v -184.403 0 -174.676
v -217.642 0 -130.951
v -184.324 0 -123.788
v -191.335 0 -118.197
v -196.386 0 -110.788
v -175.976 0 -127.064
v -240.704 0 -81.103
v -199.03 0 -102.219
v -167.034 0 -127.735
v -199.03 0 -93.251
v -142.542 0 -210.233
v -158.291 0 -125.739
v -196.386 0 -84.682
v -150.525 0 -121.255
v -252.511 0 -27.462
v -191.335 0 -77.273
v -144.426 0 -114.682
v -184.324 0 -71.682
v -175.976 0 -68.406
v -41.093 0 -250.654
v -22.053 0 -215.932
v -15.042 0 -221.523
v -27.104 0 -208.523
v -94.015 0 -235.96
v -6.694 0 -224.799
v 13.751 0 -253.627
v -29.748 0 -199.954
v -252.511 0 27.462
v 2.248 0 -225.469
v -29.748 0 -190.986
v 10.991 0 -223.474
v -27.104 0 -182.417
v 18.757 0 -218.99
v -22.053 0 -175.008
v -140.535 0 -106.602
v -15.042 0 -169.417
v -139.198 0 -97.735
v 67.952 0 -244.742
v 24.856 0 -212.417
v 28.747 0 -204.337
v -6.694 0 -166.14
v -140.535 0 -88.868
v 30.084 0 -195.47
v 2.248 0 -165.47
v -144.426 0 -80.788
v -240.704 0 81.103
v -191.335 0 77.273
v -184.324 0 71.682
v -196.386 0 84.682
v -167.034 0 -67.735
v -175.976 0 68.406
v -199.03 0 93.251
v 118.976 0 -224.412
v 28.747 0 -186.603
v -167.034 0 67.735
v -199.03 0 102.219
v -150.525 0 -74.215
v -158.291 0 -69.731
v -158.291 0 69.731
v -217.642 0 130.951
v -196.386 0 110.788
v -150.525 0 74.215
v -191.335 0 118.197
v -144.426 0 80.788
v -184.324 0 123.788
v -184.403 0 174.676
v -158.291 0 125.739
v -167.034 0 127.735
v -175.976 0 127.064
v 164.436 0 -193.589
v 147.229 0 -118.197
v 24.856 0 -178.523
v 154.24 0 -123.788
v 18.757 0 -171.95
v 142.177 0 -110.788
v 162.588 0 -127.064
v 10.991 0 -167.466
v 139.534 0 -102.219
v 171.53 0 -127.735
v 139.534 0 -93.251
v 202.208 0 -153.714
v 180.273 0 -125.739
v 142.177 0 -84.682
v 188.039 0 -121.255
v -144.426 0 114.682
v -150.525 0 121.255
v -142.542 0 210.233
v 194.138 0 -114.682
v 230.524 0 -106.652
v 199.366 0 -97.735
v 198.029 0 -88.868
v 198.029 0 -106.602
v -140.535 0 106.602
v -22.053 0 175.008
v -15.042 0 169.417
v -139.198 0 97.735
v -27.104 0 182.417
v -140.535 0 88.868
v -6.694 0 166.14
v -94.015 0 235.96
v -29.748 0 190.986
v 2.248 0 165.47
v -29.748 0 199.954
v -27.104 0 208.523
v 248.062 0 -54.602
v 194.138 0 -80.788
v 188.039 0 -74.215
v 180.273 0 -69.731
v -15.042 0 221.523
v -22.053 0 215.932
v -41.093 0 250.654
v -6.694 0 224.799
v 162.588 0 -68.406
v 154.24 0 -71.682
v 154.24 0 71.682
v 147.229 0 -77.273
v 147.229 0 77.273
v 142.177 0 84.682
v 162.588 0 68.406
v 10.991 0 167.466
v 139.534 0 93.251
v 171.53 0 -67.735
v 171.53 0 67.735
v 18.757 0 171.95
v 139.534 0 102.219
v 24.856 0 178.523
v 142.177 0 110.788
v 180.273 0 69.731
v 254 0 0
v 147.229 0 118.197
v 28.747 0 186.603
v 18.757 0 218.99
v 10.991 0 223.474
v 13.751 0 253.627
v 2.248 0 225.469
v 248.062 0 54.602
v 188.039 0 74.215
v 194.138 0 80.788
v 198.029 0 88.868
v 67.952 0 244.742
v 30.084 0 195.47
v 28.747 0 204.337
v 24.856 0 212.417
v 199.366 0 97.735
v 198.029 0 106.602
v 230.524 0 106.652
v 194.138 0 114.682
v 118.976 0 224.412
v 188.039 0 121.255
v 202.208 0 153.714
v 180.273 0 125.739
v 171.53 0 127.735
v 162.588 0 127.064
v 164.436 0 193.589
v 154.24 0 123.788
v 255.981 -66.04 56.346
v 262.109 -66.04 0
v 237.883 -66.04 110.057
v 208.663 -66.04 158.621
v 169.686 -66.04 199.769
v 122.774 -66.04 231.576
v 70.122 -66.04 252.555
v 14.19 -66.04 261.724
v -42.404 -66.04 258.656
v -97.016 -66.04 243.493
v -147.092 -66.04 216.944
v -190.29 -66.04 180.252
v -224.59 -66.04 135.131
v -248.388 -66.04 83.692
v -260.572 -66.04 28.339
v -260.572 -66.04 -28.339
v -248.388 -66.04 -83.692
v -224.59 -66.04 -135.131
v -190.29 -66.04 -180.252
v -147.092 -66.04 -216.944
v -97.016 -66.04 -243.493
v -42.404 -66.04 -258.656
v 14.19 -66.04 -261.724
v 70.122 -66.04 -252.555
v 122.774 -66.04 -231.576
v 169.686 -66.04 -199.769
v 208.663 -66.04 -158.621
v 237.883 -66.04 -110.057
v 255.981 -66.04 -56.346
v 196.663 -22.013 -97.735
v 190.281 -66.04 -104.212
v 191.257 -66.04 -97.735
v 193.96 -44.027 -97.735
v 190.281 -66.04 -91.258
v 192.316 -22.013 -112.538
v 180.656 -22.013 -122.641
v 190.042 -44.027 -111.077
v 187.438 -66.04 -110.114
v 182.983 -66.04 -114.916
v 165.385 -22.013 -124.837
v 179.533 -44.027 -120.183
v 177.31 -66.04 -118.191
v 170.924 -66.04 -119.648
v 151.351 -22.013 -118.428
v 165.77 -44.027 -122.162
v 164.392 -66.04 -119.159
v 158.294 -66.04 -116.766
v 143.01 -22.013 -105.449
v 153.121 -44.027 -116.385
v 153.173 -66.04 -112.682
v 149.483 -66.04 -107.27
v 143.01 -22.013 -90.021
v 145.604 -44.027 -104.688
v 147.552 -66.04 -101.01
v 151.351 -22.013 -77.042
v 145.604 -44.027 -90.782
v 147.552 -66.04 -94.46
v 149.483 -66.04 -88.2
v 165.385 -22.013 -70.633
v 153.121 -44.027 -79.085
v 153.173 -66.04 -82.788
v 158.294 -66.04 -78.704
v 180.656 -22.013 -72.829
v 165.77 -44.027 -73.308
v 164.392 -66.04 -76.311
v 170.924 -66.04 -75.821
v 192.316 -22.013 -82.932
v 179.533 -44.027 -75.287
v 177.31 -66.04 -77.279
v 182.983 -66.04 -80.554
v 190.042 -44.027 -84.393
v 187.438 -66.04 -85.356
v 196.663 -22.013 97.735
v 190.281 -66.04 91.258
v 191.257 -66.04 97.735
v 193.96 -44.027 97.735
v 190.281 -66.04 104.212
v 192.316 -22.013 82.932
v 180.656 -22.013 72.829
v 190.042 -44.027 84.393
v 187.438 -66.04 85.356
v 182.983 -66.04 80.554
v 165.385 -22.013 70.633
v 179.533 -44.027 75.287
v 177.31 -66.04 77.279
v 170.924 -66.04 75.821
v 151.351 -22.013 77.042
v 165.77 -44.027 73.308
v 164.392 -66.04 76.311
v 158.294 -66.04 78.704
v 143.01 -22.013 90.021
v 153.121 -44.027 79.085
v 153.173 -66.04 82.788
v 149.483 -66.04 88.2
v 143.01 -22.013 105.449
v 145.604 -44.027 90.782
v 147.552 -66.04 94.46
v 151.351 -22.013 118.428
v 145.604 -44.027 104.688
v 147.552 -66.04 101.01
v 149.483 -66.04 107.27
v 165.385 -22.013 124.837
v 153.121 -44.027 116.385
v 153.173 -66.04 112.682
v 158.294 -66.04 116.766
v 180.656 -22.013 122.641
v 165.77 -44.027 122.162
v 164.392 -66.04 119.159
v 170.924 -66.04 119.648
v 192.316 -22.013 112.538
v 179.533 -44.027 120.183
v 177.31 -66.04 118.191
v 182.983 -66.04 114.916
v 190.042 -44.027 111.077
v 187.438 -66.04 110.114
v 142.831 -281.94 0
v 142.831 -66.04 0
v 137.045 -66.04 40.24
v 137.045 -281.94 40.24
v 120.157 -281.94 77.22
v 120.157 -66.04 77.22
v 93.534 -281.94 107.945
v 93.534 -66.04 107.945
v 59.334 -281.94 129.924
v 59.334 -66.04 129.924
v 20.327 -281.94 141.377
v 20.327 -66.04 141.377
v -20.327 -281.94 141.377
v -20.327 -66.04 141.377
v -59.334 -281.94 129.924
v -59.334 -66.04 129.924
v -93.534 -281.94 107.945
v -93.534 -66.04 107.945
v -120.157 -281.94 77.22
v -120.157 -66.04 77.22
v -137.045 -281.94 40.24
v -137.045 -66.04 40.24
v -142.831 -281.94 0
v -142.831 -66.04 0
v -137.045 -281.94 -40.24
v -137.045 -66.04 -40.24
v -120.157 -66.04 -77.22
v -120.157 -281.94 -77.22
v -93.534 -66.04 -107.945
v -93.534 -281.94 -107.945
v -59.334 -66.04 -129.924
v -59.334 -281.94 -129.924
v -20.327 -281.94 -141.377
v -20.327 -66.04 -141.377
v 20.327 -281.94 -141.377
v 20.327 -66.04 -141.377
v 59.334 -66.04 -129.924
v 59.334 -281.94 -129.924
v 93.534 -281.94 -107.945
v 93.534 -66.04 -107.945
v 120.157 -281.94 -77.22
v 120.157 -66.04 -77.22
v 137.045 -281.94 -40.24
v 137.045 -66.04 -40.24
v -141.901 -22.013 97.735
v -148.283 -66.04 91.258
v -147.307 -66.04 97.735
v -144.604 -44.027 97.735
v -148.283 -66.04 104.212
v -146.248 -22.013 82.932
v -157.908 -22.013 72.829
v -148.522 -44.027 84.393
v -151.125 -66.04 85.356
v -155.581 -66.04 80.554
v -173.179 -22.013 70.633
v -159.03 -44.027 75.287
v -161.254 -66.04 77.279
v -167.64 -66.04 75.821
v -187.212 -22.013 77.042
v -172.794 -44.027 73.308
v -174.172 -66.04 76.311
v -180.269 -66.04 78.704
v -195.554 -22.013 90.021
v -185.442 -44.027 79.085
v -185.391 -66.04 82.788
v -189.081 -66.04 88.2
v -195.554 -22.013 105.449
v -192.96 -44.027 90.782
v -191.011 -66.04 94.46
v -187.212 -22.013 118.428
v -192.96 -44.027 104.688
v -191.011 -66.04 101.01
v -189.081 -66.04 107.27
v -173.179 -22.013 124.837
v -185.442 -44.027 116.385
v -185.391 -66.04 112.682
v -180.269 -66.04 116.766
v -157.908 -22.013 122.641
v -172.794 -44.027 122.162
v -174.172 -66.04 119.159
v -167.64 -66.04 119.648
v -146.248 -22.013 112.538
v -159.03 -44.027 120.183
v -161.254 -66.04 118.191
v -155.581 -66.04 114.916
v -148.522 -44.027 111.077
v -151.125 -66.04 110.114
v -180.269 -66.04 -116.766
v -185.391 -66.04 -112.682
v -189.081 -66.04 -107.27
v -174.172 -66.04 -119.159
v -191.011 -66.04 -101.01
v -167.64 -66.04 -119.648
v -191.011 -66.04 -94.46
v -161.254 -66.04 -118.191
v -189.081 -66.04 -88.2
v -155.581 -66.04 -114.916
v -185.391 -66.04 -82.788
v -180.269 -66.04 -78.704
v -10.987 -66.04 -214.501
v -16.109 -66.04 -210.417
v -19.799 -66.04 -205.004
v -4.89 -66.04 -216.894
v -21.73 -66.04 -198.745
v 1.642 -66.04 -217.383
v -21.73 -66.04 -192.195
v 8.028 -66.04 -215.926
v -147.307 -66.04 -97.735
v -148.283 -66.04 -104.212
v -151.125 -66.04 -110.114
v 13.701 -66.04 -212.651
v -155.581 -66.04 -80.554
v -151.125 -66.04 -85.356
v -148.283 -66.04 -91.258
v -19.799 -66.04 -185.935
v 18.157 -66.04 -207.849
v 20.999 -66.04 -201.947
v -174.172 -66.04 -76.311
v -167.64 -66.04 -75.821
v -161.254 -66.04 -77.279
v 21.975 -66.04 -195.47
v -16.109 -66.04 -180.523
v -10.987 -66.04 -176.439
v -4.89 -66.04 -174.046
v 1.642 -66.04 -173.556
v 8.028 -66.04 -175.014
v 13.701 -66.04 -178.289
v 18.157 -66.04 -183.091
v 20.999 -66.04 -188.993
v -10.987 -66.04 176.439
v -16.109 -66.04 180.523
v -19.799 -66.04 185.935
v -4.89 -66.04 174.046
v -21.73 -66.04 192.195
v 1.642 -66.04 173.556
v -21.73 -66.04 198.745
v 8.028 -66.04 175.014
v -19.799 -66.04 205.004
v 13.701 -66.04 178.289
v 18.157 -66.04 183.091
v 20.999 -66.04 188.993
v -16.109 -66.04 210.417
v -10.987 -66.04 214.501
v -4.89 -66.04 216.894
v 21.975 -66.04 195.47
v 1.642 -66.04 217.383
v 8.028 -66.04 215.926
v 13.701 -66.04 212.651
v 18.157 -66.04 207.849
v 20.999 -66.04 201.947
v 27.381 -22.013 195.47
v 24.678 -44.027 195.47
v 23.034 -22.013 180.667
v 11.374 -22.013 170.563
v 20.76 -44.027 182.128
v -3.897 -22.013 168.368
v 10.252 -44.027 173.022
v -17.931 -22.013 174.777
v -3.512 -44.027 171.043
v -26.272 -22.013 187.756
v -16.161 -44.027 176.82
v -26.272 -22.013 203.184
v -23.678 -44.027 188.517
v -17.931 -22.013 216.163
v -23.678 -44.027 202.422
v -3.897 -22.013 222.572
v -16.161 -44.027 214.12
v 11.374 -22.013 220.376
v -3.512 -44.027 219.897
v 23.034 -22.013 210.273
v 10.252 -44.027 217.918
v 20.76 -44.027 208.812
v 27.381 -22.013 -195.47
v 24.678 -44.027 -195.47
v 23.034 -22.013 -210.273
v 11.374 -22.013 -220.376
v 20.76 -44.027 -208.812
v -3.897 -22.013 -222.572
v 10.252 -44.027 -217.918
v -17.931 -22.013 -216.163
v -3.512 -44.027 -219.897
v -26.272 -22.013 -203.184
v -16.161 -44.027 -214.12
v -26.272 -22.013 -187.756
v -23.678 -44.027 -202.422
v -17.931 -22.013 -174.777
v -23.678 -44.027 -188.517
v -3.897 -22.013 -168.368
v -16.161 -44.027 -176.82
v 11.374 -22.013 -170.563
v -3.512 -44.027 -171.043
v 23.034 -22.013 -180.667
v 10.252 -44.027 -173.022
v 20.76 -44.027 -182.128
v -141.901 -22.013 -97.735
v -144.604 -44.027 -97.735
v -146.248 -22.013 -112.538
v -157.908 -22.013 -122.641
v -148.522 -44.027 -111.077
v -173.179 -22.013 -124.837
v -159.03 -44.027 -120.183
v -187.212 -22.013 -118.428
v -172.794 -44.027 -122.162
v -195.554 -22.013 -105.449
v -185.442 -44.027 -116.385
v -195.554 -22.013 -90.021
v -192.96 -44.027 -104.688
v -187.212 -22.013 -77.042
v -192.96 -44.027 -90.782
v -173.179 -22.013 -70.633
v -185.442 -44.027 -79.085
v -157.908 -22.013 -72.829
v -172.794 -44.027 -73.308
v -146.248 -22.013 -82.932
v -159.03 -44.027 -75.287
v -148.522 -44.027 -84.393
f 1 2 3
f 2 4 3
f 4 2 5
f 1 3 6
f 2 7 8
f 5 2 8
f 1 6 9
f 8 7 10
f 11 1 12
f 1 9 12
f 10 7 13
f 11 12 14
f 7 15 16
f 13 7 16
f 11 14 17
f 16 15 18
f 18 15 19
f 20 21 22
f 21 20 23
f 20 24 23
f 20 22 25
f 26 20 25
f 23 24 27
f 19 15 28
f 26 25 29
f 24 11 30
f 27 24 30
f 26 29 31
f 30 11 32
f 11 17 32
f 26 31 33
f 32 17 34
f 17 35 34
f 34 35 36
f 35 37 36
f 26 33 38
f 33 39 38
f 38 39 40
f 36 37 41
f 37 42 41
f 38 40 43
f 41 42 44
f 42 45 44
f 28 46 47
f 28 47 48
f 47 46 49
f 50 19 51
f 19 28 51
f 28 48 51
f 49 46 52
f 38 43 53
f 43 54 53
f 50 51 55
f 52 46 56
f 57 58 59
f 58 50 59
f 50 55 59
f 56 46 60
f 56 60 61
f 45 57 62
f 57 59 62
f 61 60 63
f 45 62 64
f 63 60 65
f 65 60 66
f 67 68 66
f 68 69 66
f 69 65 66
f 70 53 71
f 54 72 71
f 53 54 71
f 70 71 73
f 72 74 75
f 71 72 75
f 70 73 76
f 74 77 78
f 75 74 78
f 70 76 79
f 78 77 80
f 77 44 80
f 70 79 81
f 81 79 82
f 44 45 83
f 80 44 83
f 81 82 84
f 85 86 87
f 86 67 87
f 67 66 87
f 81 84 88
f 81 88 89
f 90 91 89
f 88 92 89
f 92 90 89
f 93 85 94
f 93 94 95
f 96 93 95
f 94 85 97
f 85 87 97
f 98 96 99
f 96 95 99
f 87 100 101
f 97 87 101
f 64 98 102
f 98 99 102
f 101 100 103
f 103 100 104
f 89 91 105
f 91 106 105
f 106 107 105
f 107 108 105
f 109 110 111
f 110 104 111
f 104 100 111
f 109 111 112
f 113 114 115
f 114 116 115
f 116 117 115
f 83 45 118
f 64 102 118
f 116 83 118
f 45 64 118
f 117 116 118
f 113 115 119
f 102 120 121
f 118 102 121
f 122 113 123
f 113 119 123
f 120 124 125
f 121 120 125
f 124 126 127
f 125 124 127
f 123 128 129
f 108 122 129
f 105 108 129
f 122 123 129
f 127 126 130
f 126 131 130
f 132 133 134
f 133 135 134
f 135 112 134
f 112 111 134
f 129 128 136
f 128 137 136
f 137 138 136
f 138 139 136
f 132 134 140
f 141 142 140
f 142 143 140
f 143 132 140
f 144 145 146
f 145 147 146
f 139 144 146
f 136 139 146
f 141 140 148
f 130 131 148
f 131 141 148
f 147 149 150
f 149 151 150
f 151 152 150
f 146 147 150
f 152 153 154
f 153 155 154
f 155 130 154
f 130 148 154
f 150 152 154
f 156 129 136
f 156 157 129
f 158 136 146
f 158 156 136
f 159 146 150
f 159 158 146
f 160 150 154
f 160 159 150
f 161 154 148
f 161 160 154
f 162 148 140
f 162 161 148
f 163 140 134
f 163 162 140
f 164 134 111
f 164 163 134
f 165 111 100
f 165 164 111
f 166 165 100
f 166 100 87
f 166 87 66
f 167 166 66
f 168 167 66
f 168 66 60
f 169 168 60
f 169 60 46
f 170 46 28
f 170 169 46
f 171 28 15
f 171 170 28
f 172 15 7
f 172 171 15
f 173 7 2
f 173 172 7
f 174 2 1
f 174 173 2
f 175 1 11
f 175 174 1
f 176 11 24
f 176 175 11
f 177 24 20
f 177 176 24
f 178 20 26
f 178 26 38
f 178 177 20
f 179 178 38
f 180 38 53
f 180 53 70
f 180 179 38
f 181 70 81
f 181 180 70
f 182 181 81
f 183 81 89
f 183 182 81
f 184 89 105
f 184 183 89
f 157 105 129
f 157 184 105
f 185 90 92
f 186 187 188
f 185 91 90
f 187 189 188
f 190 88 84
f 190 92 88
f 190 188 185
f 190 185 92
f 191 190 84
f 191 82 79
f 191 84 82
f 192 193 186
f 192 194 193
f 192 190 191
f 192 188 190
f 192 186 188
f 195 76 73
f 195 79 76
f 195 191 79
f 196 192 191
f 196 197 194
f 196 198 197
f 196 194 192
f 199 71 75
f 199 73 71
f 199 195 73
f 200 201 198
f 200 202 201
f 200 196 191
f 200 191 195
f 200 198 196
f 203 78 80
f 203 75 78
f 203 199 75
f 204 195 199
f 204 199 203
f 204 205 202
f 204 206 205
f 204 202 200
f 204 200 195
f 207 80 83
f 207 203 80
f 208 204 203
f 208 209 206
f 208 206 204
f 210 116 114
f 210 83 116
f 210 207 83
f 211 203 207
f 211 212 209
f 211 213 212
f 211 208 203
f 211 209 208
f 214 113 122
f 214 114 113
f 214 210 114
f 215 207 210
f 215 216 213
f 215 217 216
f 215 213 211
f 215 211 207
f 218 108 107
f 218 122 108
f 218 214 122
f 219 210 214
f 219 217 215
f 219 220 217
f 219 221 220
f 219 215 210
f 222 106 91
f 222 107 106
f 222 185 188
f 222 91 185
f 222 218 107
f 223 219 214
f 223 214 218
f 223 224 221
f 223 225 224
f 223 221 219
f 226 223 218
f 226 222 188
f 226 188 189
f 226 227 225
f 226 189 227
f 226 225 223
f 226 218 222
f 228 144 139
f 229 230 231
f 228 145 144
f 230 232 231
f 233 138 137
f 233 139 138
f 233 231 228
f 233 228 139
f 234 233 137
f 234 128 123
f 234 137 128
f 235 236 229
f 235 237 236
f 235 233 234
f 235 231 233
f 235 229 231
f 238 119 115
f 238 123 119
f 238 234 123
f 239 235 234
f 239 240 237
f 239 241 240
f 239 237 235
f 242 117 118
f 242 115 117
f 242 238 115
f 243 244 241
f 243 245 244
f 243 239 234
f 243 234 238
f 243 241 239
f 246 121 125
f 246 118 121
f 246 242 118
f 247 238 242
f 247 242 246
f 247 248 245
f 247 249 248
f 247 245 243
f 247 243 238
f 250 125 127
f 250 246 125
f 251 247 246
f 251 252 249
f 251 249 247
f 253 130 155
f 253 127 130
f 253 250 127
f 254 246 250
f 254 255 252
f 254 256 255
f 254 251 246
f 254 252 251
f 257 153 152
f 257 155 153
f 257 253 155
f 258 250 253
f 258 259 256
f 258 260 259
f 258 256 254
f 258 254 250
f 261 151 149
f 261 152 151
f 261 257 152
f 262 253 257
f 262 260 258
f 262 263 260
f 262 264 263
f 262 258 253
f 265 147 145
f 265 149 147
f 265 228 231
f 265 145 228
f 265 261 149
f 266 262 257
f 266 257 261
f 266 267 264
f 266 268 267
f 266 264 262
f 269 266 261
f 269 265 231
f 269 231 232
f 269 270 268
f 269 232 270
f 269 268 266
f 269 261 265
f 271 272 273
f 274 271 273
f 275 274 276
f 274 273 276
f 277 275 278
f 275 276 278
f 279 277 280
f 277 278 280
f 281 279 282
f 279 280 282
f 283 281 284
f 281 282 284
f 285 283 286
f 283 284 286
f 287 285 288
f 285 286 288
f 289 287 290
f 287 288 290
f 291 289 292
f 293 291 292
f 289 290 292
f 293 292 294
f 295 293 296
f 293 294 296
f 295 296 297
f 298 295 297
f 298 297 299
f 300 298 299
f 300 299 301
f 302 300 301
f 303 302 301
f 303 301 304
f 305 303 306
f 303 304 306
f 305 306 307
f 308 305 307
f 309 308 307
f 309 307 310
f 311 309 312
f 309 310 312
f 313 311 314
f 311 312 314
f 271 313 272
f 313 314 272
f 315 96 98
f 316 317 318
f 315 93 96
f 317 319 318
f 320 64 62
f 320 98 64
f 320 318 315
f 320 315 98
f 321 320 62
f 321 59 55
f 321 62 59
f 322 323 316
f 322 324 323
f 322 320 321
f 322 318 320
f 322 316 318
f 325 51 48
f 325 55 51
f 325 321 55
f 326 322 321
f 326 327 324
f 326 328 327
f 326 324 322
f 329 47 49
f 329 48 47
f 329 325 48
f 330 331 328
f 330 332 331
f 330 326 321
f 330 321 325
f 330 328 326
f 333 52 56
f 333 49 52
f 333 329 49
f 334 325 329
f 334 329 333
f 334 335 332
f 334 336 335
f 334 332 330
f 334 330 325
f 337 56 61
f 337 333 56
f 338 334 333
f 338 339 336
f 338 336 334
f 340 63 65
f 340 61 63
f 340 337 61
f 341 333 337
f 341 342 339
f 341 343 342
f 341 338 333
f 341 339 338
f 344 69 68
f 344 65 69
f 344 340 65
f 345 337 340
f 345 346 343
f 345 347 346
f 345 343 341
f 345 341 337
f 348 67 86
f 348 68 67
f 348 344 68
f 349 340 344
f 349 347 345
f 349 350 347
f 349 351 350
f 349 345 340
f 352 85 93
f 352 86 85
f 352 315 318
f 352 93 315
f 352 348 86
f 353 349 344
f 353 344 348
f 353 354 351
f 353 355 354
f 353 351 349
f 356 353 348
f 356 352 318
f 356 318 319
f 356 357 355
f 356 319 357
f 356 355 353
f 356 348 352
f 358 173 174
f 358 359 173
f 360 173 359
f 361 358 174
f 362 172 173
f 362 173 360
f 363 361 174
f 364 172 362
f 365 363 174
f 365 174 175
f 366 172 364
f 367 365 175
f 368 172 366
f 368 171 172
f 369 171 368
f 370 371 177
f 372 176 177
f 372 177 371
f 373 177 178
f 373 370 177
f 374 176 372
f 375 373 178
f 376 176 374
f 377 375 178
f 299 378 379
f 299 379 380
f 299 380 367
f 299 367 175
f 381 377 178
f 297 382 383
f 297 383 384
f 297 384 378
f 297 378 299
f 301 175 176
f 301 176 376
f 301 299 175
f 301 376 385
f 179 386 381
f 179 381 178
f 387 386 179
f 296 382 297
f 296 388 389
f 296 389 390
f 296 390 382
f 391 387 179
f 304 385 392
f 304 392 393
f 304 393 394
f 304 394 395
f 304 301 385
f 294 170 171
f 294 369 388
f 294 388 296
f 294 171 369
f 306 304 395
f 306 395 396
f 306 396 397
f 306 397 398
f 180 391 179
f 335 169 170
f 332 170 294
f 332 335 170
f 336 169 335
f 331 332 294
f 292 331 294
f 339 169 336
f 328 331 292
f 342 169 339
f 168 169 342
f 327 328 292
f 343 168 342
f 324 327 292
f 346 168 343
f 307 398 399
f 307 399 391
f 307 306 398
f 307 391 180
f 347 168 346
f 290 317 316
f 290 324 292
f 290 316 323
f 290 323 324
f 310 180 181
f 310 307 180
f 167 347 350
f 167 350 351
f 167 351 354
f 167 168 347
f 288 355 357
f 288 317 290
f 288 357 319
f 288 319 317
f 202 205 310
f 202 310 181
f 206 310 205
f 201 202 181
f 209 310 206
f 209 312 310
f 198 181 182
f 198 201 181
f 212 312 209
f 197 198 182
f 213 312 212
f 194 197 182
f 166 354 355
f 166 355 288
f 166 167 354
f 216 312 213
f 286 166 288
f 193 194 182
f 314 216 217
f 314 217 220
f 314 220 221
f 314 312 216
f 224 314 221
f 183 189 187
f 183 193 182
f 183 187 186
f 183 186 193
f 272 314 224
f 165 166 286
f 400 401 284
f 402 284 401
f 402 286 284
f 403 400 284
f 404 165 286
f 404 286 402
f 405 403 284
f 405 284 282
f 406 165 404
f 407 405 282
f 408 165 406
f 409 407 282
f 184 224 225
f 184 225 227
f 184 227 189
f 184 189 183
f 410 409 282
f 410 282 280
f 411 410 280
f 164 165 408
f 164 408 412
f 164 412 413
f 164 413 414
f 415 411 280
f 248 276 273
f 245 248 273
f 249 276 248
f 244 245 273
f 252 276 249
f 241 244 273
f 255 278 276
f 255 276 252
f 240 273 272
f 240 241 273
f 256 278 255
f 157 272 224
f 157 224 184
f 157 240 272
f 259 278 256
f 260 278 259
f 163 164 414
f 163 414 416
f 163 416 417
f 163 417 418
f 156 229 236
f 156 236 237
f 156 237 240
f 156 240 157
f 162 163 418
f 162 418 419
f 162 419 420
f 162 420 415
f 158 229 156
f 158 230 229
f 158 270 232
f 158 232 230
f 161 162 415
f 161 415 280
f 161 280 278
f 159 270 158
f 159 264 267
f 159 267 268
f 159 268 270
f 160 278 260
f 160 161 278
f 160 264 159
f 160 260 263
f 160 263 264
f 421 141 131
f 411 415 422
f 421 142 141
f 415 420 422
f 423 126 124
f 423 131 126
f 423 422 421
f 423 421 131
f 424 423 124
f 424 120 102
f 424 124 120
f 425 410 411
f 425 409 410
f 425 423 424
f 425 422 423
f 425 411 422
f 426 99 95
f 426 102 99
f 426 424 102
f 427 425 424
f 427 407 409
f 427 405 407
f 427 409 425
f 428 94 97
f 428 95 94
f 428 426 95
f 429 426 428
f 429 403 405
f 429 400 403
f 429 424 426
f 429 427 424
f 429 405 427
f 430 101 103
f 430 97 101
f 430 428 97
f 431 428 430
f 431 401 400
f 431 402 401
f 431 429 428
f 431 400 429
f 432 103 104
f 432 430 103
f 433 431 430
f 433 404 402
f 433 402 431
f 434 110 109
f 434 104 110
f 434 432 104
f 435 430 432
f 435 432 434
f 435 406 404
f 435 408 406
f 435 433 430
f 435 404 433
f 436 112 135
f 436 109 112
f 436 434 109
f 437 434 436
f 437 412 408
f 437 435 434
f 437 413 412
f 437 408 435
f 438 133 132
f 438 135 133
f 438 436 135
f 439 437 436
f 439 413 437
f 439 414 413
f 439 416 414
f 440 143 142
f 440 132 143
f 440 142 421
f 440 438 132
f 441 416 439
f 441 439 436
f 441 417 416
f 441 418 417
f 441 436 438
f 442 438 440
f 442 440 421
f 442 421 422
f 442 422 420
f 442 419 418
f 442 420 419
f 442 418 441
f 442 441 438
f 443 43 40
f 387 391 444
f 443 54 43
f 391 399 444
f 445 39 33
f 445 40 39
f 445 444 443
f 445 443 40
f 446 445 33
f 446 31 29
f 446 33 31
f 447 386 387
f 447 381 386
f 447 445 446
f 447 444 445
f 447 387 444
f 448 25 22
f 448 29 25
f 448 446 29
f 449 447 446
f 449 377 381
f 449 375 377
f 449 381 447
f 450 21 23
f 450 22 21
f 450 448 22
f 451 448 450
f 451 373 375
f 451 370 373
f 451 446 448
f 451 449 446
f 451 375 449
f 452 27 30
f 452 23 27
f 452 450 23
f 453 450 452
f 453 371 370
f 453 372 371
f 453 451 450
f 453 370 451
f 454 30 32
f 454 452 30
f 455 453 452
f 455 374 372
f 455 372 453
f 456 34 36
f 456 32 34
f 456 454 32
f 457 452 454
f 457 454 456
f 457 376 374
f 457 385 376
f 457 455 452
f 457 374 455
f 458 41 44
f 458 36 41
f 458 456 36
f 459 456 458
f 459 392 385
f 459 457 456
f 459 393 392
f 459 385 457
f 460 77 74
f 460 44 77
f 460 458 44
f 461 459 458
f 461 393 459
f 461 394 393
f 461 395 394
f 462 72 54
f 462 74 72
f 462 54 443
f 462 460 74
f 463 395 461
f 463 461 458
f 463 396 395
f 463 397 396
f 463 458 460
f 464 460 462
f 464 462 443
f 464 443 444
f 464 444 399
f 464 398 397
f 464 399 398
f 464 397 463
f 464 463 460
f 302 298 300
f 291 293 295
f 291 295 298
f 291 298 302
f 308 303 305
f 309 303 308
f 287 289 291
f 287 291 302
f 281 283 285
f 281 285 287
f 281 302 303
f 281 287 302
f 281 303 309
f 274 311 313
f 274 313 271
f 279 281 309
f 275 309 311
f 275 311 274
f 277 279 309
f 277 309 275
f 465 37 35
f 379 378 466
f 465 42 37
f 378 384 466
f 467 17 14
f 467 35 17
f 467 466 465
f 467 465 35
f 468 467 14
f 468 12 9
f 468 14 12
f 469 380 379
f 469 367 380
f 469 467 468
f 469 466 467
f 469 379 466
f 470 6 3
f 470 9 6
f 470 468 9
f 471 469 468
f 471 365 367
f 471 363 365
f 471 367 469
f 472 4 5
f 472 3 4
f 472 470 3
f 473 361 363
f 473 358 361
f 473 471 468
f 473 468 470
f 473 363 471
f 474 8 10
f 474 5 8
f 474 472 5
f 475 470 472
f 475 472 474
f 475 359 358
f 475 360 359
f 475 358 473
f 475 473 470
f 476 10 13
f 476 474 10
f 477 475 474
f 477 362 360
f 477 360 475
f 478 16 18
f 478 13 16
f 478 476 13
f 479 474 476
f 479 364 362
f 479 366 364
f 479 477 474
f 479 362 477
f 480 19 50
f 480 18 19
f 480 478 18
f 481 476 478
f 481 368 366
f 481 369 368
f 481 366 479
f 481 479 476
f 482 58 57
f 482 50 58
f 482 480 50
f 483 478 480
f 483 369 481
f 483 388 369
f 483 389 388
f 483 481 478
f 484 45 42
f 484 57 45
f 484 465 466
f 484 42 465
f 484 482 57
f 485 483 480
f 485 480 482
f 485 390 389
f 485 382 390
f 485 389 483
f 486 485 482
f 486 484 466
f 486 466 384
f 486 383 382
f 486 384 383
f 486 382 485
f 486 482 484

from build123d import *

# Parameters (mm, degrees)
F0_R     = 254
F0_R_2   = 30.0836769803
F1_DEPTH = 66.04
F1_TAPER = -7
F2_R     = 142.8310706252
F3_DEPTH = 215.9


with BuildPart() as f1:
    # F0 (on Front) → F1 (new body)
    with BuildSketch(Plane.XZ):
        Circle(F0_R)
        with Locations((-169.2818999115, -97.7349504828)):
            Circle(F0_R_2, mode=Mode.SUBTRACT)
        with Locations((0, -195.4699009657)):
            Circle(F0_R_2, mode=Mode.SUBTRACT)
        with Locations((169.2818999115, -97.7349504828)):
            Circle(F0_R_2, mode=Mode.SUBTRACT)
        with Locations((-169.2818999115, 97.7349504828)):
            Circle(F0_R_2, mode=Mode.SUBTRACT)
        with Locations((169.2818999115, 97.7349504828)):
            Circle(F0_R_2, mode=Mode.SUBTRACT)
        with Locations((0, 195.4699009657)):
            Circle(F0_R_2, mode=Mode.SUBTRACT)
    extrude(amount=F1_DEPTH, taper=F1_TAPER)

    # F2 (on face) → F3 (join)
    with BuildSketch(Plane.XZ.offset(66.04)):
        Circle(F2_R)
    extrude(amount=F3_DEPTH)


solid = f1.part
